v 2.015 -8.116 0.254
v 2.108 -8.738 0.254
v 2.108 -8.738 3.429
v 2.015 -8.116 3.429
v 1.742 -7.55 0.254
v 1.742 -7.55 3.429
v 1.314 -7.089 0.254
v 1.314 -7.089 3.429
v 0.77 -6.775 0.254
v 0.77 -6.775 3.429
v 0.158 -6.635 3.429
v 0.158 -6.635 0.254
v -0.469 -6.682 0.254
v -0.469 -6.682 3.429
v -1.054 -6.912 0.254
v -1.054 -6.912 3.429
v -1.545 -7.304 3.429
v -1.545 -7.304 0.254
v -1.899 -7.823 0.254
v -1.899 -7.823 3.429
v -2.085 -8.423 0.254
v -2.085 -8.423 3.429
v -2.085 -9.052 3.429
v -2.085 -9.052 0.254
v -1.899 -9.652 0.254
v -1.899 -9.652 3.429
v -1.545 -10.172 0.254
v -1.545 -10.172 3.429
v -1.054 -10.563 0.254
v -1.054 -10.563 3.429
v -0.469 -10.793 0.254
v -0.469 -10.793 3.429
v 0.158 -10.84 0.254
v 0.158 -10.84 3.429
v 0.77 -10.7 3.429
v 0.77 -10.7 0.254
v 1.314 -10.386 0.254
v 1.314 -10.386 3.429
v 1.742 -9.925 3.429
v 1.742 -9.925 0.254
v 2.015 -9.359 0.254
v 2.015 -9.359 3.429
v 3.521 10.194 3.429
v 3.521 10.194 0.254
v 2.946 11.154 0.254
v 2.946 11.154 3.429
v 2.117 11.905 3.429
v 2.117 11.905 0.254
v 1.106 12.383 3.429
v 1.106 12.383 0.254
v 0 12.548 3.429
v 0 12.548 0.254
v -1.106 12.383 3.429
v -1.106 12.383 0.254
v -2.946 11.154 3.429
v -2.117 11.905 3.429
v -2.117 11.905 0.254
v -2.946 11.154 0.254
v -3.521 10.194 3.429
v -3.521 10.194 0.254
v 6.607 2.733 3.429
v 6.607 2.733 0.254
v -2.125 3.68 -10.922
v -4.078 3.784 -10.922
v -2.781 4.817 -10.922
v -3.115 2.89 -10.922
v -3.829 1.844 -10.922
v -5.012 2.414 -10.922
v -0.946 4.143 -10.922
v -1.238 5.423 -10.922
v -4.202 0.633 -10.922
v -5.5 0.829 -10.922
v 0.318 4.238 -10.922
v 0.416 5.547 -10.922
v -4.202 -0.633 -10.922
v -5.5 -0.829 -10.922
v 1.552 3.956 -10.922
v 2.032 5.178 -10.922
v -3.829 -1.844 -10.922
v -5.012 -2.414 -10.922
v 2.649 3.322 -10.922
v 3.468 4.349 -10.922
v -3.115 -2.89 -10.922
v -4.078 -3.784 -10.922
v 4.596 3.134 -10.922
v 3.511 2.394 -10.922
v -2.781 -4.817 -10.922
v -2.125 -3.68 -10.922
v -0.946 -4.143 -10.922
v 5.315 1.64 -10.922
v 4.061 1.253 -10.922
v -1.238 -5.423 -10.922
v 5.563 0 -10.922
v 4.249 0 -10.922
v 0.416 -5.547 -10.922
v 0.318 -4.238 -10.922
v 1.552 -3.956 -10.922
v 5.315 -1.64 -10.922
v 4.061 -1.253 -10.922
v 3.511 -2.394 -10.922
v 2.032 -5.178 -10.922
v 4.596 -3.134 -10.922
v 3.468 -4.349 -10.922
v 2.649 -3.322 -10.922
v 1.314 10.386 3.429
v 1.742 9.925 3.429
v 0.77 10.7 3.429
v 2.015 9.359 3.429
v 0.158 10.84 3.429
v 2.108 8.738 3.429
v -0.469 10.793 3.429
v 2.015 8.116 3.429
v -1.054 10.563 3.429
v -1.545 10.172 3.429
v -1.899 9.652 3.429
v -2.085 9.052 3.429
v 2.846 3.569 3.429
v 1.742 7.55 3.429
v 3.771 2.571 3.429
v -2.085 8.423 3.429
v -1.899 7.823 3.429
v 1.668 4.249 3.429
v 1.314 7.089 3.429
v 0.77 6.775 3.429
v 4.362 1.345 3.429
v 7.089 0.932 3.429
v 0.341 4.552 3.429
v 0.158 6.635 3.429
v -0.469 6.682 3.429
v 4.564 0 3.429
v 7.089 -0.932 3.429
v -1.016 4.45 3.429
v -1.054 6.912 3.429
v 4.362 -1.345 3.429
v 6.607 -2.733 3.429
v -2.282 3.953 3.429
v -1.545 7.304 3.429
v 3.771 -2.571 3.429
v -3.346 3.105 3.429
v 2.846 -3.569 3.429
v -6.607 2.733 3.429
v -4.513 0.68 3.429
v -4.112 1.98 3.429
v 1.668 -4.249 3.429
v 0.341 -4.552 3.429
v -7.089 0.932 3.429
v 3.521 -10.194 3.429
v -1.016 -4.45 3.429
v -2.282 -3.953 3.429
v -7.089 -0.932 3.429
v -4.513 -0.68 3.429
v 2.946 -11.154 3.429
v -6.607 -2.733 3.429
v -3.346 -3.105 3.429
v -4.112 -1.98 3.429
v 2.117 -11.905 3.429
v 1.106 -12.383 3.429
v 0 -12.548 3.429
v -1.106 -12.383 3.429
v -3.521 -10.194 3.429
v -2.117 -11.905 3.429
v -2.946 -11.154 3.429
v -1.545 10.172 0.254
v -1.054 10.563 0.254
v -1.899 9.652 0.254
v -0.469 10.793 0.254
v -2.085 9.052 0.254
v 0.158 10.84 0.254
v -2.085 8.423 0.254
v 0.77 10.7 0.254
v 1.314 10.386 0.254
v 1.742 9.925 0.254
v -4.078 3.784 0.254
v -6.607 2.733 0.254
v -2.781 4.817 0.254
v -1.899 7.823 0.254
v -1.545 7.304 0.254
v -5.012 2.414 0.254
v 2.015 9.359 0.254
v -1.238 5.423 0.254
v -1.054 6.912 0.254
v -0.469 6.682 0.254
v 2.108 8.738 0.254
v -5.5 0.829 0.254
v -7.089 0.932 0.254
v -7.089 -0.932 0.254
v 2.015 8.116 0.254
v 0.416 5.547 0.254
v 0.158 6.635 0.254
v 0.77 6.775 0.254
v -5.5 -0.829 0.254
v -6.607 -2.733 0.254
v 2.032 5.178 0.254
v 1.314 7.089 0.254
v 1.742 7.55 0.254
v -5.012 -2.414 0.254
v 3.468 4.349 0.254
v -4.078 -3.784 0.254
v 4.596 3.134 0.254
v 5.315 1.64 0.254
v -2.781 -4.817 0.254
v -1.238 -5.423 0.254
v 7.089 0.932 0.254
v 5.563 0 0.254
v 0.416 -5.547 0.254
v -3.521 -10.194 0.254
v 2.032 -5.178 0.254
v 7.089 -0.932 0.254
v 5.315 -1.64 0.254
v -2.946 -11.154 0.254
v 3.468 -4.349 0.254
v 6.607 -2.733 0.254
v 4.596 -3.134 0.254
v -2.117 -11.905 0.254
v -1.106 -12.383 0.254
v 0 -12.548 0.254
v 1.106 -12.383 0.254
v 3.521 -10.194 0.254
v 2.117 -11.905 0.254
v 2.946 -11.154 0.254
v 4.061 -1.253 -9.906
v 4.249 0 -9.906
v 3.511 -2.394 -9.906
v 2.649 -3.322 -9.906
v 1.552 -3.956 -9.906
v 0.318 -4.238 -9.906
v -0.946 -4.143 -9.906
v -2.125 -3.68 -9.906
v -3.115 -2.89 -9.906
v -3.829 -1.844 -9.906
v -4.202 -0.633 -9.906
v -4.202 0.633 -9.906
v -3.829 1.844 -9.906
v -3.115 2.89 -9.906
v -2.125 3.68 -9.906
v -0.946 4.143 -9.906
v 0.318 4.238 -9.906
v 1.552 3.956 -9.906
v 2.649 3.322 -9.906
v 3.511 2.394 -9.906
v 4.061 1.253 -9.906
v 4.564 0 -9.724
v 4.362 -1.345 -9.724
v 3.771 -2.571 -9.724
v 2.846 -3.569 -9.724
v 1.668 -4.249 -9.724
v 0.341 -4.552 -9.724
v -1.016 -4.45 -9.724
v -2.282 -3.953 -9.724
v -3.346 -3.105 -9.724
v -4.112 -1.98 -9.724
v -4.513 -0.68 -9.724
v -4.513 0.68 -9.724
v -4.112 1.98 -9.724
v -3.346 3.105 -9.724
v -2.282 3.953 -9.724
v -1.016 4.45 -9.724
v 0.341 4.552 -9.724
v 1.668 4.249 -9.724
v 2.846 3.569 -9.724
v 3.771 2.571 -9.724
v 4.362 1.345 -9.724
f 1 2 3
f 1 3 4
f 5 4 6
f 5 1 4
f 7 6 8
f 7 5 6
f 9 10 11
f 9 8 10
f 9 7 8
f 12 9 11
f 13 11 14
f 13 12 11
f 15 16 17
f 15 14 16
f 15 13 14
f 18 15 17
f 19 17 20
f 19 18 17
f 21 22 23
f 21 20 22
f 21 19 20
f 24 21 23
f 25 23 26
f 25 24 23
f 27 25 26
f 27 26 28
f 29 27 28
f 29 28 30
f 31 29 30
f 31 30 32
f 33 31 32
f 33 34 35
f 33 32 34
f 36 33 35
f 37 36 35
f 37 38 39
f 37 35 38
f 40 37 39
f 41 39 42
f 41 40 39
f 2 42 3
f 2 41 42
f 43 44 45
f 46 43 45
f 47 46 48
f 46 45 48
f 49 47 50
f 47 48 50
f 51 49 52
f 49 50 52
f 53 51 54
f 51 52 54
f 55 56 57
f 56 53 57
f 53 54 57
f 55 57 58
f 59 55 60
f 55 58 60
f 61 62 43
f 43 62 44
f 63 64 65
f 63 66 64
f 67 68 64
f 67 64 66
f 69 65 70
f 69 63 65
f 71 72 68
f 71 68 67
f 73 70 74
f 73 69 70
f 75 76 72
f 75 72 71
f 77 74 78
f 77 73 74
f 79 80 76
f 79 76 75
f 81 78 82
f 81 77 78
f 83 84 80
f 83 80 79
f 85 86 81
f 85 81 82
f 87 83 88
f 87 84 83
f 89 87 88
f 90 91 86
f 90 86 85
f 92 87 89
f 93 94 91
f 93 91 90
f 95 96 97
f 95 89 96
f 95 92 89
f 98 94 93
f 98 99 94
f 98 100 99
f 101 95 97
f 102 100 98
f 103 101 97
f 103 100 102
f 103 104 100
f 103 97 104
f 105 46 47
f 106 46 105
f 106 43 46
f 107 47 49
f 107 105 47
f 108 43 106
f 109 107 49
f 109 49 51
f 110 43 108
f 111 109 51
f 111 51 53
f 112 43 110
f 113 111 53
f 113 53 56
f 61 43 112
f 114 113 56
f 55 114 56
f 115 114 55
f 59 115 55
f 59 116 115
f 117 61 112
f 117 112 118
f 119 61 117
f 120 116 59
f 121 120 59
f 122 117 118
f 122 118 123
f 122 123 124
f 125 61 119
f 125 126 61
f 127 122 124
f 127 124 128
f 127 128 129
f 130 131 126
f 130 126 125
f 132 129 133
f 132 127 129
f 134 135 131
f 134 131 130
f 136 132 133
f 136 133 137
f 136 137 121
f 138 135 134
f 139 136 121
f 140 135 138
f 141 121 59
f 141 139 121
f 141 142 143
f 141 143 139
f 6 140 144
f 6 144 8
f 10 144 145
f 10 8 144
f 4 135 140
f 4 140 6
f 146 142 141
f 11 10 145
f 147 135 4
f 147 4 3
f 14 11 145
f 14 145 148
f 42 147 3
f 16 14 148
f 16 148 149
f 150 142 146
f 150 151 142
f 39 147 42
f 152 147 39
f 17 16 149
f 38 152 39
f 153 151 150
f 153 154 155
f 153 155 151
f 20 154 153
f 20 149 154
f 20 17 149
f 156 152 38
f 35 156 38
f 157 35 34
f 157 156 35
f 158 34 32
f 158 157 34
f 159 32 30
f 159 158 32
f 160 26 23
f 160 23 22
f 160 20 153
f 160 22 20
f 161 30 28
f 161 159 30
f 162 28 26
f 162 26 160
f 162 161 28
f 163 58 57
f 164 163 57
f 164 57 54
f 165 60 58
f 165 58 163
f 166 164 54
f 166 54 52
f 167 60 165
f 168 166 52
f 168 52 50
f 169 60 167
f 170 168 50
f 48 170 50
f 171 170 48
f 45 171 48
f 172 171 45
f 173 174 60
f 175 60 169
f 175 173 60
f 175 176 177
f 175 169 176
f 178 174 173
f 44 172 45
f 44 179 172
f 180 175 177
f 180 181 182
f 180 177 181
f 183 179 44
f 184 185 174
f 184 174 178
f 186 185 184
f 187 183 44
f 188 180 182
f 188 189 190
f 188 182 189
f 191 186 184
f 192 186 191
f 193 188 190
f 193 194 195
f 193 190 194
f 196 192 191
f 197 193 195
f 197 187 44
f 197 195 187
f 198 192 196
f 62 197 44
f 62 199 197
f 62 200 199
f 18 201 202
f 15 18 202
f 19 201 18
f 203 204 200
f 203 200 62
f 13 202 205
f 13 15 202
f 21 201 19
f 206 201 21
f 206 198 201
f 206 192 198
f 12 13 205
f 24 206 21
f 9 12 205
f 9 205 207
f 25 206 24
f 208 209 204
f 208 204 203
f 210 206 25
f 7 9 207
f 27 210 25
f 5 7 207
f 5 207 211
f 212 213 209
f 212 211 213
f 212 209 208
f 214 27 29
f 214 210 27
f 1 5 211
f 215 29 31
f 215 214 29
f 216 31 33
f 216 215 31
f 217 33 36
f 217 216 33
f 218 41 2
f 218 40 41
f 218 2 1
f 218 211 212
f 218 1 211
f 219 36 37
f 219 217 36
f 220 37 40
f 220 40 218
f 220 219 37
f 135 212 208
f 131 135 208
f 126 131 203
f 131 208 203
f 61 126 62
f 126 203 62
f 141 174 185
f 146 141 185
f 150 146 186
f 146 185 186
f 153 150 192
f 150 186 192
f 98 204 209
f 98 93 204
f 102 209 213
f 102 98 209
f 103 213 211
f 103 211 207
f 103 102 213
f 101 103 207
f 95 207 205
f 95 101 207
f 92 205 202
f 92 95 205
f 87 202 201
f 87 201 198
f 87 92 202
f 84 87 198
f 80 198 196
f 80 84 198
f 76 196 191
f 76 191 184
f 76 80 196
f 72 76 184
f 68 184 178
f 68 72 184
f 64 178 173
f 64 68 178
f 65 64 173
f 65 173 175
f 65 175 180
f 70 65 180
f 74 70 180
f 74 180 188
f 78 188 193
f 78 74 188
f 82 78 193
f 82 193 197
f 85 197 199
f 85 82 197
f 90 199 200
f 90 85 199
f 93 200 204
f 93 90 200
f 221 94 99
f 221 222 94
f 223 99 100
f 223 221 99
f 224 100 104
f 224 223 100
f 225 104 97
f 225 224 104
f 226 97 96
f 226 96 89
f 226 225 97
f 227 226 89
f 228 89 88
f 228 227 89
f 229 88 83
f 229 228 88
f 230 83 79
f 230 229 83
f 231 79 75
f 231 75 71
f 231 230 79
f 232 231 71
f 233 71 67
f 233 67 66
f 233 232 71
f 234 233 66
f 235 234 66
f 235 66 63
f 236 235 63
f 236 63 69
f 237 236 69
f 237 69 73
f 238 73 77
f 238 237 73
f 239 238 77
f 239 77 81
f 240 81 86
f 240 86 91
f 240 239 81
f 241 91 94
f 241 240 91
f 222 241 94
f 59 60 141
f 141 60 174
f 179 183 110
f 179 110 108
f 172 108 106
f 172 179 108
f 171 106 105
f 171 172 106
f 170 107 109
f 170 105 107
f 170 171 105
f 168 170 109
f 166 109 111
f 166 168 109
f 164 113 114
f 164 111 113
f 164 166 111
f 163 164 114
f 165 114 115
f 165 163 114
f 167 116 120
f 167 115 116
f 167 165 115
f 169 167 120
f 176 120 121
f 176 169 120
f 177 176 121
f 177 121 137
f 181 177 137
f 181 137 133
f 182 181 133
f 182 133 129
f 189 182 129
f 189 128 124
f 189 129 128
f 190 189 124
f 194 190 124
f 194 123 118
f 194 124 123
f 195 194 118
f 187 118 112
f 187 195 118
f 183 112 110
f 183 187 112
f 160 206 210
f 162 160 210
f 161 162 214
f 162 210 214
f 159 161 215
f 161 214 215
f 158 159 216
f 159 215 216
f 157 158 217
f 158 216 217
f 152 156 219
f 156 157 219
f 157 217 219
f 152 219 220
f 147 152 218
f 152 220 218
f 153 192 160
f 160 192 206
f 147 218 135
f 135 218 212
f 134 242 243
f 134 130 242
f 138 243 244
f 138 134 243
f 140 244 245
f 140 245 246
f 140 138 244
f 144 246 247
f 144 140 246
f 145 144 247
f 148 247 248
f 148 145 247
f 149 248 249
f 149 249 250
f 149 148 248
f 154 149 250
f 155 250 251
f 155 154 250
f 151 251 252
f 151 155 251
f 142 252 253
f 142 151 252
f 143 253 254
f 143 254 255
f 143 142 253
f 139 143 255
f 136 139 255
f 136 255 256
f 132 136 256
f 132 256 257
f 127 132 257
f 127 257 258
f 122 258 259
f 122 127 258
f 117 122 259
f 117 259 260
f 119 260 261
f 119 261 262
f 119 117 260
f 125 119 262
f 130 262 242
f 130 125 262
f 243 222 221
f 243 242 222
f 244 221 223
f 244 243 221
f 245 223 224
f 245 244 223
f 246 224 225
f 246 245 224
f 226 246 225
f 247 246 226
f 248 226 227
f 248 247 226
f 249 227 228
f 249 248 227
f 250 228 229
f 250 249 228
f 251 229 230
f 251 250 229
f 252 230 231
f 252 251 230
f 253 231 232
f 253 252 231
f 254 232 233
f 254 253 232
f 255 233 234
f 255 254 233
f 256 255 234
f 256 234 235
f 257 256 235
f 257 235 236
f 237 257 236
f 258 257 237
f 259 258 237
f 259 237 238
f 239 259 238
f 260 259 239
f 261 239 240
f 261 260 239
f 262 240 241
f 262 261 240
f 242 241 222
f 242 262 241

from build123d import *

# Parameters (mm, degrees)
SKETCH2_OUTSIDE_W  = 35.136
SKETCH2_OUTSIDE_H  = 35.136
SKETCH2_OUTSIDE_R  = 2.1082
CUT_EXTRUDE1_DEPTH = 22.020706078


with BuildPart() as part:
    # Sketch1 → Revolve1 (revolve)
    with BuildSketch(Plane(origin=(0, 0, 0), x_dir=(0, 0, -1), z_dir=(1, 0, 0)), mode=Mode.PRIVATE) as revolve1_sk:
        Polygon((-0.254, 5.5626), (10.922, 5.5626), (10.922, 4.24942), (9.906, 4.24942), (9.724157759, 4.56438), (-3.429, 4.56438), (-3.429, 12.7), (-0.254, 12.7), align=None)
    revolve(revolve1_sk.sketch.rotate(Axis((0, 0, -8.471806123), (0, 0, -1)), 90), axis=Axis((0, 0, -8.471806123), (0, 0, -1)))

    # Sketch2 outside → Cut-Extrude1 (cut, through all)
    # profile 1 of 3: a face of its own
    with BuildSketch(Plane.XY):
        Rectangle(SKETCH2_OUTSIDE_W, SKETCH2_OUTSIDE_H)
        with BuildLine():
            Line((6.607062287, 2.733250436), (3.520637098, 10.194038953))
            ThreePointArc((3.520637098, 10.194038953), (0, 12.5476), (-3.520637098, 10.194038953))
            Line((-3.520637098, 10.194038953), (-6.607062287, 2.733250436))
            ThreePointArc((-6.607062287, 2.733250436), (-7.1501, 0), (-6.607062287, -2.733250436))
            Line((-6.607062287, -2.733250436), (-3.520637098, -10.194038953))
            ThreePointArc((-3.520637098, -10.194038953), (0, -12.5476), (3.520637098, -10.194038953))
            Line((3.520637098, -10.194038953), (6.607062287, -2.733250436))
            ThreePointArc((6.607062287, -2.733250436), (7.1501, 0), (6.607062287, 2.733250436))
        make_face(mode=Mode.SUBTRACT)
    # profile 2 of 3: a face of its own
    with BuildSketch(Plane.XY):
        with Locations((0, 8.7376)):
            Circle(SKETCH2_OUTSIDE_R)
    # profile 3 of 3: a face of its own
    with BuildSketch(Plane.XY):
        with Locations((0, -8.7376)):
            Circle(SKETCH2_OUTSIDE_R)
    extrude(amount=CUT_EXTRUDE1_DEPTH, mode=Mode.SUBTRACT)


solid = part.part
